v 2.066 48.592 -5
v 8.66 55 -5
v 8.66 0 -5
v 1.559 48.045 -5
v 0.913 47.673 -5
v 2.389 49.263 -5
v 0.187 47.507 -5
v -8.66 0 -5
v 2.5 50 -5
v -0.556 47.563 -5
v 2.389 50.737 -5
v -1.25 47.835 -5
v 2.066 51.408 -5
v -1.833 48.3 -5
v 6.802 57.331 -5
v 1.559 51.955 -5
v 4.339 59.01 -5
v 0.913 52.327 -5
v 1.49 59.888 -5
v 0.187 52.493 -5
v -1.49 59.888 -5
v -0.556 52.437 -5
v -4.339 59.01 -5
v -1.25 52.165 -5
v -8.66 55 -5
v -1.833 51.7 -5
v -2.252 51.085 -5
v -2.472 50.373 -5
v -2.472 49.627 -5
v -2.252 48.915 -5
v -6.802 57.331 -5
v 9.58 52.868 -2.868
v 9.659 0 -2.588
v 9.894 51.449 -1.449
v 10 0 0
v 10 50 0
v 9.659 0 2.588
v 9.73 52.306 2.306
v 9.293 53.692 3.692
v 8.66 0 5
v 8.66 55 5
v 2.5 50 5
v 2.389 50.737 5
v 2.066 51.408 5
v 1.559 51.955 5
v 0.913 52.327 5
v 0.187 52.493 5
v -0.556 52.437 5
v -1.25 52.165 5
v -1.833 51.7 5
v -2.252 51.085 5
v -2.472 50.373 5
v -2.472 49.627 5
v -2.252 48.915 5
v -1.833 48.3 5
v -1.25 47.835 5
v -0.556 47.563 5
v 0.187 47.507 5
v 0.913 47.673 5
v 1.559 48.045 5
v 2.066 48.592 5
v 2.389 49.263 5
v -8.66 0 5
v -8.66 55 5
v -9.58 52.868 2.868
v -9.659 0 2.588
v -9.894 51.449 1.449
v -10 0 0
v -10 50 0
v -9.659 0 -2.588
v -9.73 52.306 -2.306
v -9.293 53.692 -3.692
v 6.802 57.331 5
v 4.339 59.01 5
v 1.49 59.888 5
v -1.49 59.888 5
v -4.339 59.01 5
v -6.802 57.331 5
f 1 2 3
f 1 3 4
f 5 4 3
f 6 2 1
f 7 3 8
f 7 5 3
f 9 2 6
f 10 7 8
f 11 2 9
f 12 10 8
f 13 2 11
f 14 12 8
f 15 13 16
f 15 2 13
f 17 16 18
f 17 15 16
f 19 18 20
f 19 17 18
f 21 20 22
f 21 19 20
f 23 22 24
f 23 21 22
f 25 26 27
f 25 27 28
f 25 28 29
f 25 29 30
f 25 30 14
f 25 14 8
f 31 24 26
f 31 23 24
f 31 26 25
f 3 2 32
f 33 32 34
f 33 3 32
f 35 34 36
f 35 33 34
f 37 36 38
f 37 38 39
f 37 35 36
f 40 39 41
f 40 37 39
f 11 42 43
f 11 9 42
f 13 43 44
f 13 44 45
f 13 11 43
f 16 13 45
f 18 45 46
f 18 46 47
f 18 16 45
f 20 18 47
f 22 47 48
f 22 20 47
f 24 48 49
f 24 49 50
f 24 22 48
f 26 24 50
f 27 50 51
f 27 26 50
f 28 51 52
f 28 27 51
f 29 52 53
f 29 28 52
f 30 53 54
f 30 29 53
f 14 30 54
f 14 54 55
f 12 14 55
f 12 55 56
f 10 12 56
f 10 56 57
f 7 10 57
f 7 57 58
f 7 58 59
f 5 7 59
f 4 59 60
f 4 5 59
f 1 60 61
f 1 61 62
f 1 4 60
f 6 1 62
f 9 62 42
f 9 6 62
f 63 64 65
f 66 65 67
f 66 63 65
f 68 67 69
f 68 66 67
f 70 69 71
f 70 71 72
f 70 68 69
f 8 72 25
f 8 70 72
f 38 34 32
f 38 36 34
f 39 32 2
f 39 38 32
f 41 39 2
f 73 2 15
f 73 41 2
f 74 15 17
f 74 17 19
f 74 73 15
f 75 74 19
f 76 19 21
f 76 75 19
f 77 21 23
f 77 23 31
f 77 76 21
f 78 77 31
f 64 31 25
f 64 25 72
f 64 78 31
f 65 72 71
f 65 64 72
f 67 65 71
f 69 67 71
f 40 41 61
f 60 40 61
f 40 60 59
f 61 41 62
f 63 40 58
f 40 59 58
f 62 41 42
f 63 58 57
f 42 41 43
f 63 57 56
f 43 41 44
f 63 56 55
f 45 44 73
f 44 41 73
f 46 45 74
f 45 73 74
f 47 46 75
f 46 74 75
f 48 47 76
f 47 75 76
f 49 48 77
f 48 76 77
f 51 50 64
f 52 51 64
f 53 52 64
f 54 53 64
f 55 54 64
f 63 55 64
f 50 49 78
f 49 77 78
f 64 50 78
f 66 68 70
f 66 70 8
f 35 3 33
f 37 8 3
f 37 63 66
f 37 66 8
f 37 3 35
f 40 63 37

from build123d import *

# Parameters (mm, degrees)
SKETCH002_R  = 2.5
PAD001_DEPTH = 5
SKETCH003_R  = 10
PAD002_DEPTH = 60


with BuildPart() as lugbody:
    # Sketch002 → Pad001 (new body, symmetric)
    with BuildSketch(Plane.XY):
        with BuildLine():
            Line((-10, 0), (-10, 50))
            ThreePointArc((10, 50), (0, 60), (-10, 50))
            Line((10, 50), (10, 0))
            Line((10, 0), (-10, 0))
        make_face()
        with Locations((0, 50)):
            Circle(SKETCH002_R, mode=Mode.SUBTRACT)
    extrude(amount=PAD001_DEPTH, both=True)


with BuildPart() as lugcylinder:
    # Sketch003 → Pad002 (new body)
    with BuildSketch(Plane.XZ):
        Circle(SKETCH003_R)
    extrude(amount=-PAD002_DEPTH)

    # Boolean: intersect LugBody
    add(lugbody.part, mode=Mode.INTERSECT)


solid = lugcylinder.part
